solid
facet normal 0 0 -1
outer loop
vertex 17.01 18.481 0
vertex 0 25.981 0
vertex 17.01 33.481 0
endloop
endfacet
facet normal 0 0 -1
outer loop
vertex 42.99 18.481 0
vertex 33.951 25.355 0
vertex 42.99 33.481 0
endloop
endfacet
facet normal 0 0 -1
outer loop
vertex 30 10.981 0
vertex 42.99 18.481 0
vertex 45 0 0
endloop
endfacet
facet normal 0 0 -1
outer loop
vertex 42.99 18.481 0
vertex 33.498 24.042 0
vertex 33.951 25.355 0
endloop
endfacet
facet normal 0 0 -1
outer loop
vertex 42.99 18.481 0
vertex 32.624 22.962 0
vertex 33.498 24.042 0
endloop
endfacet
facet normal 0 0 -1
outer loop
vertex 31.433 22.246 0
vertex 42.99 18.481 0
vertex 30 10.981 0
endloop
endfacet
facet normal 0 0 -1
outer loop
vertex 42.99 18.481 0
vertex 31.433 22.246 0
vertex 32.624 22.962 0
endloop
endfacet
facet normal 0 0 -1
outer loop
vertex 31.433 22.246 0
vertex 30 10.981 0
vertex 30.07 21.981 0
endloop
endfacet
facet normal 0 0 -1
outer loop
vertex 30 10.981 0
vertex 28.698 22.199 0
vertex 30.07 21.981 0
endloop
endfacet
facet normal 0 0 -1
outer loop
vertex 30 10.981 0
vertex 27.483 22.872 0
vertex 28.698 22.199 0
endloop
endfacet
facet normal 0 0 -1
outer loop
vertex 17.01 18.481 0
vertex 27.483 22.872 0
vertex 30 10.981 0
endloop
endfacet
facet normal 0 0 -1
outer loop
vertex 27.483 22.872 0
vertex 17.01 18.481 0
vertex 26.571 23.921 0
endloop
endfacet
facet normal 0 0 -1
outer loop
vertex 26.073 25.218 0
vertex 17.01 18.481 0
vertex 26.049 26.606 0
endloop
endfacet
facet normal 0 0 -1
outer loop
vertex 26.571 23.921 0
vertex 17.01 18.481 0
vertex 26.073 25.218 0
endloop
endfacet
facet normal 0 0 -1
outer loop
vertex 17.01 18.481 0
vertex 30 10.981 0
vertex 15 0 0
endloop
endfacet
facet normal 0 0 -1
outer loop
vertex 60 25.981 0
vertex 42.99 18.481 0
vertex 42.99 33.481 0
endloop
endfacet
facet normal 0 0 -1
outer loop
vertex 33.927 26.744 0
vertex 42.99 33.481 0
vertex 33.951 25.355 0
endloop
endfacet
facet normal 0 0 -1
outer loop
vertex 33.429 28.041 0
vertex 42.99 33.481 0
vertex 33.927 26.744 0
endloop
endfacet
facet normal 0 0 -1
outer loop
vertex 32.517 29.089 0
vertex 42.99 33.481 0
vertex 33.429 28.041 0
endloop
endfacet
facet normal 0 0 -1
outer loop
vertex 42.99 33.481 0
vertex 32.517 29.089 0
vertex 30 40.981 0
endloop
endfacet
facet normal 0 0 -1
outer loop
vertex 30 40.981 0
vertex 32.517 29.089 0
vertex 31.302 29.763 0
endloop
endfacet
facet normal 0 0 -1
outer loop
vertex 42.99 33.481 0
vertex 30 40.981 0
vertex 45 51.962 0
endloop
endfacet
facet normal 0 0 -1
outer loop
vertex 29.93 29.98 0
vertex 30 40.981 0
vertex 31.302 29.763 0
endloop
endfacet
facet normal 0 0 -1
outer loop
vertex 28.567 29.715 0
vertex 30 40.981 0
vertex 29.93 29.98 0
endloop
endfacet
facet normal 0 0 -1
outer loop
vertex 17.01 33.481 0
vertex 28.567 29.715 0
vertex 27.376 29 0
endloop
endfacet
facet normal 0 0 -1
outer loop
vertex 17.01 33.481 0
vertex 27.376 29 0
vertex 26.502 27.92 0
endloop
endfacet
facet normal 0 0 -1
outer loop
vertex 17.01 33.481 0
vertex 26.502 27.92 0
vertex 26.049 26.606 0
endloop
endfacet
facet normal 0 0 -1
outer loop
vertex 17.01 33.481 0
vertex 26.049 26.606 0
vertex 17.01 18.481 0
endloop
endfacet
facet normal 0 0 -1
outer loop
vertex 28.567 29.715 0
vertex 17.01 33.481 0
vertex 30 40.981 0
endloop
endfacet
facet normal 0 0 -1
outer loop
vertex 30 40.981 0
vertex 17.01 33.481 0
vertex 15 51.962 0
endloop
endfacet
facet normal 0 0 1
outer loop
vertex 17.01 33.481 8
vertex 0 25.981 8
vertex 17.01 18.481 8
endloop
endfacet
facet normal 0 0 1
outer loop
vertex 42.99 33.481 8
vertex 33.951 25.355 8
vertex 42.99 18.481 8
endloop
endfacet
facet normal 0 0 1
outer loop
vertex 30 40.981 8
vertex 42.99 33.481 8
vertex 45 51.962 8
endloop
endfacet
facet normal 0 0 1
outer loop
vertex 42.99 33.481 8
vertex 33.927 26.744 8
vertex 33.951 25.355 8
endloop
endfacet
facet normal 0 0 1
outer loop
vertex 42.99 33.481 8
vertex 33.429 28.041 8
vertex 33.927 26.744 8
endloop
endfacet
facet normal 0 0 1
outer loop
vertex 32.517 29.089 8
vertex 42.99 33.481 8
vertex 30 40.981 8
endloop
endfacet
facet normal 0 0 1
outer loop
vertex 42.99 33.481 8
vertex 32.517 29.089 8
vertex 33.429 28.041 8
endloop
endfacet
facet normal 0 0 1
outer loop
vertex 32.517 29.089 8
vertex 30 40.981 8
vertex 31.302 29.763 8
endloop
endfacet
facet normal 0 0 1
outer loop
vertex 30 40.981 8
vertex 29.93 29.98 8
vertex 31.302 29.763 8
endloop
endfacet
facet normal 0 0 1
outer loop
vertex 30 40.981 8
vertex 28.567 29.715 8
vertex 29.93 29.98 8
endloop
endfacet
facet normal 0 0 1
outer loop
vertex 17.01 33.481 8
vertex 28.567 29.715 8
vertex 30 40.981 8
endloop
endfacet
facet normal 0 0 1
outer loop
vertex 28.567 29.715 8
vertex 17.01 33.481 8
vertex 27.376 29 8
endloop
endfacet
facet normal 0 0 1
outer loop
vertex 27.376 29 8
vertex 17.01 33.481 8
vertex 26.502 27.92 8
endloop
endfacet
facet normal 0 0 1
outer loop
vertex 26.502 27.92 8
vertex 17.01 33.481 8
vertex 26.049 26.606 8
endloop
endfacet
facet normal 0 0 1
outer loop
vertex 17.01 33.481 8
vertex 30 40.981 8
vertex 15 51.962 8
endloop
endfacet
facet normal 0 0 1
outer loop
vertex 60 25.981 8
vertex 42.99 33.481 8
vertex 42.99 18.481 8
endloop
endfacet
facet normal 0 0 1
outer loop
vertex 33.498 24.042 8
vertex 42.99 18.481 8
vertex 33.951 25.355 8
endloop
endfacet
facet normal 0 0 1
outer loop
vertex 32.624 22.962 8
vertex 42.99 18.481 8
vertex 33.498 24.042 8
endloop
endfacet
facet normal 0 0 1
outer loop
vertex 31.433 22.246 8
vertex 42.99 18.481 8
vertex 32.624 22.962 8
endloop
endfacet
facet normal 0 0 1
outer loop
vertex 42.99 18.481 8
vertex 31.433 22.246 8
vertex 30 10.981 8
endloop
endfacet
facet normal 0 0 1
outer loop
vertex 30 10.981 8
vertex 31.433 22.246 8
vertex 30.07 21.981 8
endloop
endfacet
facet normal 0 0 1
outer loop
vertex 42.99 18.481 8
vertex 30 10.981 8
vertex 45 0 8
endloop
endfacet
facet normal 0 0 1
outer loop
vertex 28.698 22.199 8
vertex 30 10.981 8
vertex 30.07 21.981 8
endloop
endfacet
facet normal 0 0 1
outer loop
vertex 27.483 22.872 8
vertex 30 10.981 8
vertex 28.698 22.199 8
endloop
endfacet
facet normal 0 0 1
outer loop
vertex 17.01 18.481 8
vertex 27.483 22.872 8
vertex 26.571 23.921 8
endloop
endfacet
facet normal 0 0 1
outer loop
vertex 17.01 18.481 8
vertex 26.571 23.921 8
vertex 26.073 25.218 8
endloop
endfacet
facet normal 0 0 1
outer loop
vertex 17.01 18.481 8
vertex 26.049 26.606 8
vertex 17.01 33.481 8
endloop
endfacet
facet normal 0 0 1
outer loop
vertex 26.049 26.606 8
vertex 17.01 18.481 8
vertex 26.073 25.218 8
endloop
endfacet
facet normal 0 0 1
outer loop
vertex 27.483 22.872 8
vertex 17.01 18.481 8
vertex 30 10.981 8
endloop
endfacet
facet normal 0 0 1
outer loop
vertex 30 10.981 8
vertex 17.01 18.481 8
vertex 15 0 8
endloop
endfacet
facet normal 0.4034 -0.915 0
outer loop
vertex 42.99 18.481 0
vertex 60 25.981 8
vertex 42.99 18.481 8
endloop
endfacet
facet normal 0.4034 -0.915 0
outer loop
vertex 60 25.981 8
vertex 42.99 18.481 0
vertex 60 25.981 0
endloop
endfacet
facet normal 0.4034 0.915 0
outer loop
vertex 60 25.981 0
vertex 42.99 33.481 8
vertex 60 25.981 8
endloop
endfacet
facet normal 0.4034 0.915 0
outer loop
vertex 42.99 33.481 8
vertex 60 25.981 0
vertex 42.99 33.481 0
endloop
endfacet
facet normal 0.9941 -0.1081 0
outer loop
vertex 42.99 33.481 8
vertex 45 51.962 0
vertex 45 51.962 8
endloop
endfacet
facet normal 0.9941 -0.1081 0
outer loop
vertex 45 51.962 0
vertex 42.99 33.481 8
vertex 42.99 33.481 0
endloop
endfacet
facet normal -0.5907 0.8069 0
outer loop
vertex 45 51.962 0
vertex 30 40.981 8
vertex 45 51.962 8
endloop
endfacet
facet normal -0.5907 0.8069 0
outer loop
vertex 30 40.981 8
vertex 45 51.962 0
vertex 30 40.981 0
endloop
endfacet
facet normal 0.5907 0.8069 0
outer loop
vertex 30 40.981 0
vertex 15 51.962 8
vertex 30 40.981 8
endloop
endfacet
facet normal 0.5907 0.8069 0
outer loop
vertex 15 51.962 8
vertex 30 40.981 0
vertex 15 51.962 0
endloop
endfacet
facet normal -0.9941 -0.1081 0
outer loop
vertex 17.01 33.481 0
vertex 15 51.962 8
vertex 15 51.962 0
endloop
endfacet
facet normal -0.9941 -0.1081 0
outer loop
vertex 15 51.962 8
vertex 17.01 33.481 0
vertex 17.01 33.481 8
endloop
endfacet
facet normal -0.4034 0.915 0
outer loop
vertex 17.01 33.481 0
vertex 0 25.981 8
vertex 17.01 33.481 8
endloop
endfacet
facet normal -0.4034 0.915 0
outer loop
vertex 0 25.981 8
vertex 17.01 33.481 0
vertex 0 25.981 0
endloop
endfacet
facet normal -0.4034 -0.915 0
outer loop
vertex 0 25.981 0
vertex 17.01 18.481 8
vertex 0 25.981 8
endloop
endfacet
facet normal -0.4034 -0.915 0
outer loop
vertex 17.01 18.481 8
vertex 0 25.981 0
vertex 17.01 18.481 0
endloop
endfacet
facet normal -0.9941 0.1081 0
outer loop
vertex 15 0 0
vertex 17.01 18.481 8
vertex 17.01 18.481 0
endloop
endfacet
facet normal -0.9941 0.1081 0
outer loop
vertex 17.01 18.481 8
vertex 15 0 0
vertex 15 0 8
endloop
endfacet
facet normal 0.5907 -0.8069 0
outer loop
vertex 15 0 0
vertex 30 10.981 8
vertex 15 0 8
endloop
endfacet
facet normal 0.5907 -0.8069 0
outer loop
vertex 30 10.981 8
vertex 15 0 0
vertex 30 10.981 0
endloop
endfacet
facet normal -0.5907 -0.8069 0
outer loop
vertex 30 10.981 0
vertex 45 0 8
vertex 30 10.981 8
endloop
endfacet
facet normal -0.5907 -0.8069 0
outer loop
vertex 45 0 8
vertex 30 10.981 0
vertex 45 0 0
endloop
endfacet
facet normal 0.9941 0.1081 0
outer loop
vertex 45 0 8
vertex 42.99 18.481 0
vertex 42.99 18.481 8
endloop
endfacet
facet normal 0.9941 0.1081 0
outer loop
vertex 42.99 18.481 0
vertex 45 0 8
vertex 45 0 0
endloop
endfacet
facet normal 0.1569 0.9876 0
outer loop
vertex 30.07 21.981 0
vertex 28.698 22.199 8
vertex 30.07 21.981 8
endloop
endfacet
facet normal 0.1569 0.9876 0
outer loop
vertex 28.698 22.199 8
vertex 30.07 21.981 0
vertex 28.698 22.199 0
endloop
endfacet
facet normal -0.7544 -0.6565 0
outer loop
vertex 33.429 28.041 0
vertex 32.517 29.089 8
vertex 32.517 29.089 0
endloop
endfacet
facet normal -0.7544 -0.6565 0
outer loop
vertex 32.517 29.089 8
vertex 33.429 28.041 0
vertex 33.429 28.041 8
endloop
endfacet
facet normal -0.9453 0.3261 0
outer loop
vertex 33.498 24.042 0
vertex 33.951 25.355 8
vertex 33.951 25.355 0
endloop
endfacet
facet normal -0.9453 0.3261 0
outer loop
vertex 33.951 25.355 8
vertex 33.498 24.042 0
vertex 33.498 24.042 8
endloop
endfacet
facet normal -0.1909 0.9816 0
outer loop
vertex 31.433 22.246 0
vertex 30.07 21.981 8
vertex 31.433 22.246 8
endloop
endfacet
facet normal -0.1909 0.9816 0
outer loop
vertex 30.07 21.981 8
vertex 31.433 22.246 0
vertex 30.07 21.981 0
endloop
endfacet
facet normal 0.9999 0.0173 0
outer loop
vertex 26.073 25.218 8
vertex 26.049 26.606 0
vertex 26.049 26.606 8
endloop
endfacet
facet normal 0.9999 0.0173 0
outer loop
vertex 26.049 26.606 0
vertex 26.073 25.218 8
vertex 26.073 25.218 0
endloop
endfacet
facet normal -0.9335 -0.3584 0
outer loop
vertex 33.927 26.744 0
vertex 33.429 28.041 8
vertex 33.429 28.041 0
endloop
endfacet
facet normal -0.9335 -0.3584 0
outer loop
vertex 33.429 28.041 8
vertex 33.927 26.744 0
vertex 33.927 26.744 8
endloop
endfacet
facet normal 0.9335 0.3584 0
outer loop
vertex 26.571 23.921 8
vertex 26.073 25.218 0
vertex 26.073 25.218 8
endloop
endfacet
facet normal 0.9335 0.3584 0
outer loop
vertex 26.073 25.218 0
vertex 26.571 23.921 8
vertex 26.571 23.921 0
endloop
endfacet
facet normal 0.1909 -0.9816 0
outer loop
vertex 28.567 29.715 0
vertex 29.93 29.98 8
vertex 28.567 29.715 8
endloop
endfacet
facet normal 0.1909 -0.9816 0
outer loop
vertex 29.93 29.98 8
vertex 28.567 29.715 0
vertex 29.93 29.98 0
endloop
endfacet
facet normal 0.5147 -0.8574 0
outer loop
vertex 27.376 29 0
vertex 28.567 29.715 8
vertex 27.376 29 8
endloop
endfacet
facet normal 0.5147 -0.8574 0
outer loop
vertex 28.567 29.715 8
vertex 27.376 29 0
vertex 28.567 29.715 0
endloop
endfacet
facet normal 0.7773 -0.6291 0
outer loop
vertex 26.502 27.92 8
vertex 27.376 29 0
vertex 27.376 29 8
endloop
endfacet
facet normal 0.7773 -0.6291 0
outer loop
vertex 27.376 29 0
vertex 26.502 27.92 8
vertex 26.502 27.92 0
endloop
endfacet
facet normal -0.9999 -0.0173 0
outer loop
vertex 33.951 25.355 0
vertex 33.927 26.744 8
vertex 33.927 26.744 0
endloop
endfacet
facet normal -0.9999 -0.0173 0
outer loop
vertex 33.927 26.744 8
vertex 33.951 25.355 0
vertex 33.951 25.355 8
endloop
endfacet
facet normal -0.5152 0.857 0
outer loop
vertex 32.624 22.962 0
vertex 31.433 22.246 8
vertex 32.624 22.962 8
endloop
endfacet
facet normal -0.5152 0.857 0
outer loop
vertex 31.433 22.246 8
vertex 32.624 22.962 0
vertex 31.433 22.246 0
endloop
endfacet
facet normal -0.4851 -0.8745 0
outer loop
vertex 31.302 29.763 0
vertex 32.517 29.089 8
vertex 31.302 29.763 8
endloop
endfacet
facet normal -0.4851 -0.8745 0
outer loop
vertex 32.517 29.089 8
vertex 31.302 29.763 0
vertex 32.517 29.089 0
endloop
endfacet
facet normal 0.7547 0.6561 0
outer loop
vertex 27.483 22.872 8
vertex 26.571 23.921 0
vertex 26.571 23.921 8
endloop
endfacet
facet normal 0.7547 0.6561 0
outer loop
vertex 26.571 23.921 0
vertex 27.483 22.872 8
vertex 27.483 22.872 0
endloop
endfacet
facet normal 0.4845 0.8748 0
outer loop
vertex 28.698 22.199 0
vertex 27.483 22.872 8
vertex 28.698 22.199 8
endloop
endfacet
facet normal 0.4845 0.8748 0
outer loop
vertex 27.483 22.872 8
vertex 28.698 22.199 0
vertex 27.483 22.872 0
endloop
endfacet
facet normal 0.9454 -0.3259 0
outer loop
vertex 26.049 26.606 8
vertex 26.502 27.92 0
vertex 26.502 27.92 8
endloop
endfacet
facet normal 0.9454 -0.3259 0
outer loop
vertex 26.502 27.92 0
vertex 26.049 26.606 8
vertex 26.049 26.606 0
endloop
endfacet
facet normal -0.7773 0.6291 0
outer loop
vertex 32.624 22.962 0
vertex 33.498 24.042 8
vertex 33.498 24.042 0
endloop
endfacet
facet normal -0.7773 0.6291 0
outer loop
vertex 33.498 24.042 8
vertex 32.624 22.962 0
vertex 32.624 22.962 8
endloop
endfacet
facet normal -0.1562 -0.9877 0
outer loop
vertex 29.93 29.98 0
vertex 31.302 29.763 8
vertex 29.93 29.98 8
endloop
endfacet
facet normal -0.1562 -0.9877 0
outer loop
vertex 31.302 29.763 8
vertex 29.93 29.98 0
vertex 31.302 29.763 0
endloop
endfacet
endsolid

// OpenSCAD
$fn = 32;

// ----------------------------------------------------------------------
// Star wheel: 6-point star, R30
// ----------------------------------------------------------------------

// --- parameters (mm) ---
n_points = 6;             // number of points / teeth
r_out = 30;               // tip radius
r_in = 15;                // root radius
bore_r = 4;               // centre bore radius
plate_t = 8;              // plate thickness, Z (extrusion height)
bore_d = 8;               // centre bore diameter

profile = [[0, 25.981], [17.01, 18.481], [15, 0], [30, 10.981], [45, 0], [42.99, 18.481], [60, 25.981], [42.99, 33.481], [45, 51.962], [30, 40.981], [15, 51.962], [17.01, 33.481]];  // primary outline, 12 points, counter clockwise
void_1 = [[33.927, 26.744], [33.429, 28.041], [32.517, 29.089], [31.302, 29.763], [29.93, 29.98], [28.567, 29.715], [27.376, 29], [26.502, 27.92], [26.049, 26.606], [26.073, 25.218], [26.571, 23.921], [27.483, 22.872], [28.698, 22.199], [30.07, 21.981], [31.433, 22.246], [32.624, 22.962], [33.498, 24.042], [33.951, 25.355]];  // centre bore, 18 points

// --- the one profile operation ---
difference() {
  linear_extrude(height = plate_t) polygon(points = profile);
  translate([0, 0, -1])
    linear_extrude(height = plate_t + 2) polygon(points = void_1);
}
